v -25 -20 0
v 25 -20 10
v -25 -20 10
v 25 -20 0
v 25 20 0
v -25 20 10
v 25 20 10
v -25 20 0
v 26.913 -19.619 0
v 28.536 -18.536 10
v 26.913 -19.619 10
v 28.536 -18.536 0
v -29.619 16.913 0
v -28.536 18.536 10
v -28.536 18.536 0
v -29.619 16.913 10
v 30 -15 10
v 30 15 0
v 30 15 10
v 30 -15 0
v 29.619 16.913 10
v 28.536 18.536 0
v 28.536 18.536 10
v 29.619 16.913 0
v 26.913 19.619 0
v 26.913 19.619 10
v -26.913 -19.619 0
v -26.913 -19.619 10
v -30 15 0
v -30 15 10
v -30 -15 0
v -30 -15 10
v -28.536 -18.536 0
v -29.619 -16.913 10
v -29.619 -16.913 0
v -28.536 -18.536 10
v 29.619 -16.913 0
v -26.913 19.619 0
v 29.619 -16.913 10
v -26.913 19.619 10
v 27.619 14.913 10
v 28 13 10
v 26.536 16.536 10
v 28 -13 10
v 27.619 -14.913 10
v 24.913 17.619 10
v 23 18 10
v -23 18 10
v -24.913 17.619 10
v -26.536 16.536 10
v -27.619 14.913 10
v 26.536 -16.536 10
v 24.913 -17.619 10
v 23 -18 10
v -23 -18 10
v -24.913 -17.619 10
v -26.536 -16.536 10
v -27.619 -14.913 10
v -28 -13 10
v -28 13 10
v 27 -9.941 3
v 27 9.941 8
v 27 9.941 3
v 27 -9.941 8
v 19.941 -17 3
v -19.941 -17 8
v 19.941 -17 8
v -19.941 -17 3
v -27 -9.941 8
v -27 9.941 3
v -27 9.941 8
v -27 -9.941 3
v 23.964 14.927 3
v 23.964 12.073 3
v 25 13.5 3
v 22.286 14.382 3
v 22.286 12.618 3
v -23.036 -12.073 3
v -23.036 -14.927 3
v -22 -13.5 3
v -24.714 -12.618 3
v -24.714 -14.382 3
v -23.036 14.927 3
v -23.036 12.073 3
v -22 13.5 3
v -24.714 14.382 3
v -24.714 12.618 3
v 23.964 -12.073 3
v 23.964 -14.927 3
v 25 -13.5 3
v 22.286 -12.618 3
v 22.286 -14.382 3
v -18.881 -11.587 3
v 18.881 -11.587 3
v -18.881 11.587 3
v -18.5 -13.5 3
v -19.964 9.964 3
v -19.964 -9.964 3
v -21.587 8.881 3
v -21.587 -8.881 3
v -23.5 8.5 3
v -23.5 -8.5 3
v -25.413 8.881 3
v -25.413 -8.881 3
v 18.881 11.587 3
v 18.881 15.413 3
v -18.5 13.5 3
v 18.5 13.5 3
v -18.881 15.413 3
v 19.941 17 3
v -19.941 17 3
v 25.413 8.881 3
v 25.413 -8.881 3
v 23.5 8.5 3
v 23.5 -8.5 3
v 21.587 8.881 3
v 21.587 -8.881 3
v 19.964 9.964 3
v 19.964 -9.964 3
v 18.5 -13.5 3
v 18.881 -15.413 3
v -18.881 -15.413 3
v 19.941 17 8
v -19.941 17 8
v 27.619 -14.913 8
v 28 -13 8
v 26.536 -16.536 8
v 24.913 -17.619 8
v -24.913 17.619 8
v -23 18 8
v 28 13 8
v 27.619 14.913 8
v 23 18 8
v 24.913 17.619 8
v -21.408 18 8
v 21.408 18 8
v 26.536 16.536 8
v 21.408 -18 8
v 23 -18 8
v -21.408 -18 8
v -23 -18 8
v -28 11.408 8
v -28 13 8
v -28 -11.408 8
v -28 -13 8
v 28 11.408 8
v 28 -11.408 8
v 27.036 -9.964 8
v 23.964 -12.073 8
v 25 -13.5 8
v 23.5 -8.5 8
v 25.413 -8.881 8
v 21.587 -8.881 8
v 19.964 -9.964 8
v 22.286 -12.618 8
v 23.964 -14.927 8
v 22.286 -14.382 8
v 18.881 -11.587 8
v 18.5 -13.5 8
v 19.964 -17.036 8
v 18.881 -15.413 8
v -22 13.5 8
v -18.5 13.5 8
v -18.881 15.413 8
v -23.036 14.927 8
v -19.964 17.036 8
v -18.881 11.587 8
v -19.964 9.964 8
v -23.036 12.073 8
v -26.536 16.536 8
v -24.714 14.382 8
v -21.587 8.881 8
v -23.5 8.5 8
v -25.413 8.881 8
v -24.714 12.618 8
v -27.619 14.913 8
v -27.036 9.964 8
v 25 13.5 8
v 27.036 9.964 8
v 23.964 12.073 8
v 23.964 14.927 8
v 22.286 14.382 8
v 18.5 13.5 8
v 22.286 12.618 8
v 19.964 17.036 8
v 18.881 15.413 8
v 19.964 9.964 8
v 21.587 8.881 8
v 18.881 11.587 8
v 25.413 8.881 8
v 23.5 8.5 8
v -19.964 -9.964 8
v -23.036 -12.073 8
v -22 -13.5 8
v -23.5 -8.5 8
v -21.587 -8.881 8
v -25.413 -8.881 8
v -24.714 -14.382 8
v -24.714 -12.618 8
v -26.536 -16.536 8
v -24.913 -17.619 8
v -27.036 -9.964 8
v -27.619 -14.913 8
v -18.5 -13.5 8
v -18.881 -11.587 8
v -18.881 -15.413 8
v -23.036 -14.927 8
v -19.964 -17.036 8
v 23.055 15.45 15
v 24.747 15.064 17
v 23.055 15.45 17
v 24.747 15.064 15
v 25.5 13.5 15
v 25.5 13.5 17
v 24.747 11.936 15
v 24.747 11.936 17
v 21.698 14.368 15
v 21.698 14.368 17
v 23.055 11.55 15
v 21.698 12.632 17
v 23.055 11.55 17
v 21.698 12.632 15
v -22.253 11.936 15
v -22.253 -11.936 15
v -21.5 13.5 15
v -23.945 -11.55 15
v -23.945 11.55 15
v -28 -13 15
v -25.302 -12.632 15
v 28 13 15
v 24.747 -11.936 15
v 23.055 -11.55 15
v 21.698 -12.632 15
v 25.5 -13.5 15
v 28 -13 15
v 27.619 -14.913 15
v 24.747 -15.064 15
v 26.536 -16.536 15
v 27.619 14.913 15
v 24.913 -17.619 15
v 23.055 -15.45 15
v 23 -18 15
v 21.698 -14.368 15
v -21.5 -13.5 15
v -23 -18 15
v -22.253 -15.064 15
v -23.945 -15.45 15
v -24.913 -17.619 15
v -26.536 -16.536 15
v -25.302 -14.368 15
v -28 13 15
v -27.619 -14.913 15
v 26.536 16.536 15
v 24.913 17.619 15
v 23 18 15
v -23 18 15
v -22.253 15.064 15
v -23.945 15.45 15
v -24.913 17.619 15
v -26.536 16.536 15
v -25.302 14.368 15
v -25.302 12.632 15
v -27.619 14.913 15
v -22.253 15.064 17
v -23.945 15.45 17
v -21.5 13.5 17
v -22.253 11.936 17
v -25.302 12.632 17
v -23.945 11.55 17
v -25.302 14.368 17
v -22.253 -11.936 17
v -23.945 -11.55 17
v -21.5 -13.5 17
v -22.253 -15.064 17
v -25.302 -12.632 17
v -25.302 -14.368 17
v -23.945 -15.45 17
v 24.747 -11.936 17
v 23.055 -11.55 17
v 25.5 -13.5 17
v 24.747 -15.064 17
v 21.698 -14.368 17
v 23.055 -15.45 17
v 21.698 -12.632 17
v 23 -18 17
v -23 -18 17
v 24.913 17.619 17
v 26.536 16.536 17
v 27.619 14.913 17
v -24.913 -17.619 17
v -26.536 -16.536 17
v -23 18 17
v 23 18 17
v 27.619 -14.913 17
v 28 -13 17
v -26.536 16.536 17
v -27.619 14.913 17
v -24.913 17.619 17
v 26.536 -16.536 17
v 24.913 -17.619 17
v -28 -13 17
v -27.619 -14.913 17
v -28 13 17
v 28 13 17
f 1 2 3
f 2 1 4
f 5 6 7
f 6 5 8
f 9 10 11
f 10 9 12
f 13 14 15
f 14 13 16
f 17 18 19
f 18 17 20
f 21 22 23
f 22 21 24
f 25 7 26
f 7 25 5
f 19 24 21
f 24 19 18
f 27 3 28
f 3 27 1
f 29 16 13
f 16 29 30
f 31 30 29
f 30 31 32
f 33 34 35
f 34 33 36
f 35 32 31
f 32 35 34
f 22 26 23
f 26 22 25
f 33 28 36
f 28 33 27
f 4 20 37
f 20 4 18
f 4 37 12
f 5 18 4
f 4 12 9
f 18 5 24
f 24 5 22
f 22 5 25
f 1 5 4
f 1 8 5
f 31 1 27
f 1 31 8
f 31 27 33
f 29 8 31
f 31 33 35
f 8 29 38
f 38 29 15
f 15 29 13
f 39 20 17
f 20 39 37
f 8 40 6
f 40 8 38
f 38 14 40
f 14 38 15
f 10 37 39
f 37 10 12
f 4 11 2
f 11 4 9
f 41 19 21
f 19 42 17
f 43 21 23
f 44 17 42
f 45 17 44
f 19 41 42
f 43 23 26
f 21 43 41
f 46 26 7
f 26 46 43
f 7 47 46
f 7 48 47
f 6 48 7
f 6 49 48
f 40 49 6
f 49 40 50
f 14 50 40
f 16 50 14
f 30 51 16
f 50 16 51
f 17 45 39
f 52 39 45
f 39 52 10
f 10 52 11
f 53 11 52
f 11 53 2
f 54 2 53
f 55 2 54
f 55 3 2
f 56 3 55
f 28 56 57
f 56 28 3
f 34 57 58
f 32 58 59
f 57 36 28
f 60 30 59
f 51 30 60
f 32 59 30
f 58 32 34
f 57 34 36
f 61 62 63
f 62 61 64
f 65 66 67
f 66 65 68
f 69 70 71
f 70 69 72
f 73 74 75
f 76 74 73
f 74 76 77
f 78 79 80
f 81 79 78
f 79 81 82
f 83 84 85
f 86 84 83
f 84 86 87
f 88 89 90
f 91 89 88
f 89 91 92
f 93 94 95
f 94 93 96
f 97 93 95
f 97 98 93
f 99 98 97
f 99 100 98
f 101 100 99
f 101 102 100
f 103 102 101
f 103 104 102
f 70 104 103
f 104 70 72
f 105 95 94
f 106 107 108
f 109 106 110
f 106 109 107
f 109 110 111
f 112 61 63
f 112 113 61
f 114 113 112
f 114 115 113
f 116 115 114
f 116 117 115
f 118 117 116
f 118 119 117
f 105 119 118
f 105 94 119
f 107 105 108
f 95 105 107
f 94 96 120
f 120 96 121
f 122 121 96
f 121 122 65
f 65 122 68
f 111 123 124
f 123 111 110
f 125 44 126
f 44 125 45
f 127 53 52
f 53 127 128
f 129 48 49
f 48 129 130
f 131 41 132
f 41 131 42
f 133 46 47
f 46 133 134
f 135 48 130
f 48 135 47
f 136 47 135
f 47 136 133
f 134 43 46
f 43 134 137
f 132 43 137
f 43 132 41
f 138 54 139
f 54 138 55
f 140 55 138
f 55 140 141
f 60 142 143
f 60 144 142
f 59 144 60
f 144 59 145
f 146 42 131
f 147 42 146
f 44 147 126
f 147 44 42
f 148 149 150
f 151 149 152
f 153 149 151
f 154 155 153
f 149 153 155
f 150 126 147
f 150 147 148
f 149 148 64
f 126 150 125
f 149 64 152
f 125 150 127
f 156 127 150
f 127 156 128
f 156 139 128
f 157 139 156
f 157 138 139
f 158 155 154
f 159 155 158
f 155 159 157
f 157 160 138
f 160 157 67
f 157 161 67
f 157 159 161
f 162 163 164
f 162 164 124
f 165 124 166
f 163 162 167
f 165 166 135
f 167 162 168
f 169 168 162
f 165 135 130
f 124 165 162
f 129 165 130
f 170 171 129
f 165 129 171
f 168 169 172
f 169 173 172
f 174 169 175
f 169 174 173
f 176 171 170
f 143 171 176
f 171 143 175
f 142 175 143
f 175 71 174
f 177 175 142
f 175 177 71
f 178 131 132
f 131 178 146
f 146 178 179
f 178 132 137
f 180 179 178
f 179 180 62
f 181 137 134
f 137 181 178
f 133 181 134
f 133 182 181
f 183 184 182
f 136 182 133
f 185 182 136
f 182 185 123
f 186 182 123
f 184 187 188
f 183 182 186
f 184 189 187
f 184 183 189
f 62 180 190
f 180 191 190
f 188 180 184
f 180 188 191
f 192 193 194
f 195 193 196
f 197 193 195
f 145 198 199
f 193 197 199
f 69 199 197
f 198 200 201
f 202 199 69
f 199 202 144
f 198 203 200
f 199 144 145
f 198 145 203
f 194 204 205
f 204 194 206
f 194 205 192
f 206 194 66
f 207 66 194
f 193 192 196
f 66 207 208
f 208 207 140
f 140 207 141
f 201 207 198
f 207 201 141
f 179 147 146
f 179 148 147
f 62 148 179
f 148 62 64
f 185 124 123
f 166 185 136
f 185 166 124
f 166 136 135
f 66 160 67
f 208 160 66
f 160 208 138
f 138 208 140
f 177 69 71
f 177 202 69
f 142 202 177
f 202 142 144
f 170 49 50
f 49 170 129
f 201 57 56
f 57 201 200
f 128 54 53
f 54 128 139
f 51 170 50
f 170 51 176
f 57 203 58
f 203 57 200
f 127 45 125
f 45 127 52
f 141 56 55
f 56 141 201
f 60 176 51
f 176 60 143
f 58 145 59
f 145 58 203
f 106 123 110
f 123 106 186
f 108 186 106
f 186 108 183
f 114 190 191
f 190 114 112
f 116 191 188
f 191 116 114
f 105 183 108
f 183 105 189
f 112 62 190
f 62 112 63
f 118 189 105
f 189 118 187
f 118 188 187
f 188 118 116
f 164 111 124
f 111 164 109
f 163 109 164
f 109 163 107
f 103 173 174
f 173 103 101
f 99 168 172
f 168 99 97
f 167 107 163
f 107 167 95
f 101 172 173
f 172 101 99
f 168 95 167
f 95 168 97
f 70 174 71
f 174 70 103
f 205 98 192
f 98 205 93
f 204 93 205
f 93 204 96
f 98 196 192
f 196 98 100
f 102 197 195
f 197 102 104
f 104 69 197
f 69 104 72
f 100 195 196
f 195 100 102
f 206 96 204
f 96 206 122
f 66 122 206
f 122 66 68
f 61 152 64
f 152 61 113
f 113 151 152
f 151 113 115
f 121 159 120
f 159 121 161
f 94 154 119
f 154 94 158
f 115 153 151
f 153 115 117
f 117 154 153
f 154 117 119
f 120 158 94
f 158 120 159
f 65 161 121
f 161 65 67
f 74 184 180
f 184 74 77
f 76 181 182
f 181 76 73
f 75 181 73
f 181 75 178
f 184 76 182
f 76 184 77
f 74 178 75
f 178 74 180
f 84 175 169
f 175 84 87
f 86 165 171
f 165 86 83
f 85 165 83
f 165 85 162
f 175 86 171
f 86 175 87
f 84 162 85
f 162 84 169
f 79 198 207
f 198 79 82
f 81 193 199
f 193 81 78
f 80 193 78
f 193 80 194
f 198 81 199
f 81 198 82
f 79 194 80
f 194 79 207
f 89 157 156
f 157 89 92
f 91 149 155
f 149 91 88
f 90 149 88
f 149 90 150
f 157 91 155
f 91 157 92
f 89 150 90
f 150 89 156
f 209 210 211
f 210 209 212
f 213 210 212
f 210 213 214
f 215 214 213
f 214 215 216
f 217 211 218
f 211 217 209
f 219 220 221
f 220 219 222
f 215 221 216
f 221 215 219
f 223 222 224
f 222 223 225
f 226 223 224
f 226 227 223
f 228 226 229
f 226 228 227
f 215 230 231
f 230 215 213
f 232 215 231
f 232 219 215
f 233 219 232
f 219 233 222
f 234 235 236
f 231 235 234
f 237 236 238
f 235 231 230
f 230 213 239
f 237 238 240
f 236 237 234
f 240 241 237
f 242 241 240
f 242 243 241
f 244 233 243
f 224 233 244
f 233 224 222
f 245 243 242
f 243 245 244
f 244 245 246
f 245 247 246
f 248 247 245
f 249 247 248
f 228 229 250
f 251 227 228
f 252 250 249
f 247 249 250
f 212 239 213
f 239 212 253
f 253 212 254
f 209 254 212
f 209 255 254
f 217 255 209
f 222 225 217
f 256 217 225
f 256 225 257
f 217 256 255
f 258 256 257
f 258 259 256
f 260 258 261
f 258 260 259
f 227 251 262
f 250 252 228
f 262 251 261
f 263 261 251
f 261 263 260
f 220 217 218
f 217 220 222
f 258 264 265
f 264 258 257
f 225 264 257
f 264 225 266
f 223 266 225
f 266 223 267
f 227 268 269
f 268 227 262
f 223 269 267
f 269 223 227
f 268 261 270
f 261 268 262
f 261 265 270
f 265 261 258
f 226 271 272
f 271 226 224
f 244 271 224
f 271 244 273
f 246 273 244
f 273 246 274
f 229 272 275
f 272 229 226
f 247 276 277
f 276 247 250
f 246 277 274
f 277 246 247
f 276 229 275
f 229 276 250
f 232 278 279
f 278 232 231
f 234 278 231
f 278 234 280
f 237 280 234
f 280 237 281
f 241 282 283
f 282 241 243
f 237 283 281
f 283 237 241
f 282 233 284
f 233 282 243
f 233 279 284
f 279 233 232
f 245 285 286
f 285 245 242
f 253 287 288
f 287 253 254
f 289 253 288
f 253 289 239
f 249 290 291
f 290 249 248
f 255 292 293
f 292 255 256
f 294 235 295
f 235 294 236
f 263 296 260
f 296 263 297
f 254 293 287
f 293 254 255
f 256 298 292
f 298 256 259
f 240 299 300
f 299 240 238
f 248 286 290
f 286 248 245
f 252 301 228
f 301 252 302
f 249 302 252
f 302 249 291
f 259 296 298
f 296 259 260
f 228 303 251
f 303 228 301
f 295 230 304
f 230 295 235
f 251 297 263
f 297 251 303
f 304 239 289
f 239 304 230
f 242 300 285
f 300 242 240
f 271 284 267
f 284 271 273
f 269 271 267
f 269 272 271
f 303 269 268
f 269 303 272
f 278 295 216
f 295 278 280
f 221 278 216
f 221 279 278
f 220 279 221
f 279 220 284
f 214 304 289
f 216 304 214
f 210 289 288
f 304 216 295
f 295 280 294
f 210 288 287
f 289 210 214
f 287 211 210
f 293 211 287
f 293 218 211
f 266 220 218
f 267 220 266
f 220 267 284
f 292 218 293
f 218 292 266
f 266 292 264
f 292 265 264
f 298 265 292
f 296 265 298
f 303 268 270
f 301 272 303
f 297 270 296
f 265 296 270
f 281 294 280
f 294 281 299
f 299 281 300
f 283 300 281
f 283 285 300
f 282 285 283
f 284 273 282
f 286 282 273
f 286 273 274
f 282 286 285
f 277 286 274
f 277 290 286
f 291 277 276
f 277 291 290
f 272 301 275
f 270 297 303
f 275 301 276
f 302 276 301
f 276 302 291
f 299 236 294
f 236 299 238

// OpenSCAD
//$fn = 100;

width = 60; // X
length = 40; // Y
height = 10; // X

corner_radius = 5;
wall_thickness = 3;
post_diameter = 10;
hole_diameter = 3;

lid_thickness = 2;
lid_lip = 2;
lid_tolerance = 0.5;

// Define the posts
module posts(x,y,z,h,r){
    translate([x,y,z]){cylinder(r=r, h=h);}
    translate([-x,y,z]){cylinder(r=r, h=h);}
    translate([-x,-y,z]){cylinder(r=r, h=h);}
    translate([x,-y,z]){cylinder(r=r, h=h);}
}

difference(){
    union(){
        difference(){
            // Generate the Enclosure
            hull(){
                posts(
                    x=(width / 2 - corner_radius),
                    y=(length / 2 - corner_radius),
                    z=0,
                    h=height,
                    r=corner_radius
                );
            }

            // Hollow out the enclosure
            hull(){
                posts(
                    x=(width / 2 - corner_radius - wall_thickness),
                    y=(length / 2 - corner_radius - wall_thickness),
                    z=wall_thickness,
                    h=height,
                    r=corner_radius
                );
            }

            // Generate the Lip
            hull(){
                posts(
                    x=(width / 2 - corner_radius - lid_lip),
                    y=(length / 2 - corner_radius - lid_lip),
                    z=(height - lid_thickness),
                    h=lid_thickness + 1,
                    r=corner_radius
                );
            }
        }

        difference(){
            // Support Posts
            posts(
                x = (width/2 - wall_thickness/2 - post_diameter/2),
                y = (length/2 - wall_thickness/2 - post_diameter/2),
                z = wall_thickness - .5,
                h = height - wall_thickness - lid_thickness + 0.5,
                r = post_diameter/2
            );

            // Holes in Posts
            posts(
                x = (width/2 - wall_thickness/2 - post_diameter/2),
                y = (length/2 - wall_thickness/2 - post_diameter/2),
                z = wall_thickness,
                h = height - wall_thickness - lid_thickness + 0.5,
                r = hole_diameter/2
            );
        }
    }
}

//Generate the Lid
difference(){
    hull(){
        posts(
            x = (width/2 - corner_radius - wall_thickness/2 - lid_tolerance),
            y = (length/2 - corner_radius - wall_thickness/2 - lid_tolerance),
            z = height - lid_thickness + 7,
            h = lid_thickness,
            r = corner_radius
        );
    }
    posts(
        x = (width/2 - wall_thickness/2 - post_diameter/2),
        y = (length/2 - wall_thickness/2 - post_diameter/2),
        z = height - lid_thickness + 7,
        h = height - wall_thickness - lid_thickness + .5,
        r = hole_diameter / 2 + .5
    );
}
